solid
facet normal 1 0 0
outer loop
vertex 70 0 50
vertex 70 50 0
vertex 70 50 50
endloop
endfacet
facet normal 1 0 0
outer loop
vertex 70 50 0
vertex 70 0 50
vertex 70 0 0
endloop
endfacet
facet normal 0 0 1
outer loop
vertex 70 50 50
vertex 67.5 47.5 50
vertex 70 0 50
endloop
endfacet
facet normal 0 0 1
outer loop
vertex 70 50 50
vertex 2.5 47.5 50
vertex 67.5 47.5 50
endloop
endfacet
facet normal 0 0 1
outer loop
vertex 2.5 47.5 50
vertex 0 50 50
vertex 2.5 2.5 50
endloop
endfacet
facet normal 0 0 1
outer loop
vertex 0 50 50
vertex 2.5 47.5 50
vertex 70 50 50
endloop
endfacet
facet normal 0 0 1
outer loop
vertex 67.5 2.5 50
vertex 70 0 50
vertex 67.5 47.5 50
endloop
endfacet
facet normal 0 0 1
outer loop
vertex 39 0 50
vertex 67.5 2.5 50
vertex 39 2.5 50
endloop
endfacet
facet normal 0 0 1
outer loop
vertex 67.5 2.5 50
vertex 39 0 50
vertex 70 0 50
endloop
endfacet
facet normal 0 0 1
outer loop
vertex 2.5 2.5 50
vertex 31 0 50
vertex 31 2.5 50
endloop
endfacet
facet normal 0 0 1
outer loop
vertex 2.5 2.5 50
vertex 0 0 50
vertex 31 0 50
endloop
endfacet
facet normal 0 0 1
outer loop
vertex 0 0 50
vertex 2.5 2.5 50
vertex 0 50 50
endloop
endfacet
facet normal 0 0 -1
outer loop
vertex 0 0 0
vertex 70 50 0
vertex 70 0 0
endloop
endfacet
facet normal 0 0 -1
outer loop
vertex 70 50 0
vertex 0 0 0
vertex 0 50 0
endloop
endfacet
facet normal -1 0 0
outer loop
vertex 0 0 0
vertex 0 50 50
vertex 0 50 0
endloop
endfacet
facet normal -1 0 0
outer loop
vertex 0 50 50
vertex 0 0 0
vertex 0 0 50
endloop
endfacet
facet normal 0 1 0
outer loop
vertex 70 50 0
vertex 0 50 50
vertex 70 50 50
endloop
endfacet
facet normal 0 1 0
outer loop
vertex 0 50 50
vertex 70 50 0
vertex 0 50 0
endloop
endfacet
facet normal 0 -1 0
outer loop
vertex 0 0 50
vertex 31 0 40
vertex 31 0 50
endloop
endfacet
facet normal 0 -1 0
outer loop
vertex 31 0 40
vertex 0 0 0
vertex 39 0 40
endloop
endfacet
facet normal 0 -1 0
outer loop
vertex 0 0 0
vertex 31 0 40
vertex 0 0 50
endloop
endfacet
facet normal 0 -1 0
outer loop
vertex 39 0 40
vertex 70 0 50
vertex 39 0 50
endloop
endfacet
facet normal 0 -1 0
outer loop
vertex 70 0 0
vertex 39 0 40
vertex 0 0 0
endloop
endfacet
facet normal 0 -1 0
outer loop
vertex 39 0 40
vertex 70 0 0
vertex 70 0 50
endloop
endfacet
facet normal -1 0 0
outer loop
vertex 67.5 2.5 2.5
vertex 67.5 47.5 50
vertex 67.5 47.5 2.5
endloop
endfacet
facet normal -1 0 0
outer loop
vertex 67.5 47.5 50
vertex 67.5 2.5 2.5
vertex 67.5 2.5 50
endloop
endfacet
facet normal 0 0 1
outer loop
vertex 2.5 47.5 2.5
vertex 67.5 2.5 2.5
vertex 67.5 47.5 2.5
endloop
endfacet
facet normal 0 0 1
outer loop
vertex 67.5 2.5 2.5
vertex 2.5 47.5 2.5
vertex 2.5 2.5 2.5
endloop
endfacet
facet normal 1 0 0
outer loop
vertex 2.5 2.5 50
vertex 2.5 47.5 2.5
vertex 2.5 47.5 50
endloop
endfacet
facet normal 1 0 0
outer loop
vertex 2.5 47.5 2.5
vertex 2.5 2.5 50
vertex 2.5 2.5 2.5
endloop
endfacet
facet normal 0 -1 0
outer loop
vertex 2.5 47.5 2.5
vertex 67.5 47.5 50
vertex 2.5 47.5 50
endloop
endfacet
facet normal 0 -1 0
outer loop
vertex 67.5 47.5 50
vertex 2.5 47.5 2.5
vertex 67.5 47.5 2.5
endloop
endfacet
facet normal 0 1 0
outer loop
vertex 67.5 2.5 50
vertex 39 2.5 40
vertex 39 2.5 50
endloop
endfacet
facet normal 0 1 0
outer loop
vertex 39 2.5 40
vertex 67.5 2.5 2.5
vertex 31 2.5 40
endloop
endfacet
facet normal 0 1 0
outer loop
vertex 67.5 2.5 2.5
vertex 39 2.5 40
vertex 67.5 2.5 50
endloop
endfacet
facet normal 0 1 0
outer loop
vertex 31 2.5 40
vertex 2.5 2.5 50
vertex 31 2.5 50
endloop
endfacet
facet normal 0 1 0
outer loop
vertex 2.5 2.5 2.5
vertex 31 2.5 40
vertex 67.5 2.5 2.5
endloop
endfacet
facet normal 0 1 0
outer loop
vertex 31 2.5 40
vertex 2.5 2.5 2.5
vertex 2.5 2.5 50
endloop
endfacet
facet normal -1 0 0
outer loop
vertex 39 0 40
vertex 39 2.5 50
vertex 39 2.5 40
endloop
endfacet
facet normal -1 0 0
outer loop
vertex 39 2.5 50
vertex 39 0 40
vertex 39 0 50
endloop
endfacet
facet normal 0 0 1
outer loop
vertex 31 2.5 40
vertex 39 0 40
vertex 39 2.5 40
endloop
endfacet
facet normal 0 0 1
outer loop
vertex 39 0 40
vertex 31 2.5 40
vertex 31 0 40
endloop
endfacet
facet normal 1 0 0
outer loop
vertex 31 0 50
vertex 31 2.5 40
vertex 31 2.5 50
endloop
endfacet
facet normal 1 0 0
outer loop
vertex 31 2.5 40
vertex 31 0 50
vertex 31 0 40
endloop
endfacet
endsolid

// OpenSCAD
$fn = 32;
// target_bbox: 70, 50, 50
// ----------------------------------------------------------------------
// Enclosure box: notch enclosure
// ----------------------------------------------------------------------

// --- parameters (mm) ---
box_l = 70;               // outer length, X
box_w = 50;               // outer width, Y
box_h = 50;               // outer height
wall_t = 2.5;             // wall thickness
notch_w = 8;              // cable notch width
notch_h = 10;             // cable notch height
fit_tol = 0.05;           // tolerance for press fits, mm
free_tol = 0.2;           // tolerance for clearance fits, mm

inner_h = box_h - wall_t;  // cavity depth
boss_h = inner_h - 2;  // corner boss height

difference() {
  union() {
    difference() {
      cube([box_l, box_w, box_h]);
      translate([wall_t, wall_t, wall_t])
        cube([box_l - 2 * wall_t, box_w - 2 * wall_t, box_h]);
    }
  }
  translate([box_l / 2 - notch_w / 2, -1, box_h - notch_h])
    cube([notch_w, wall_t + 2, notch_h + 1]);
}
